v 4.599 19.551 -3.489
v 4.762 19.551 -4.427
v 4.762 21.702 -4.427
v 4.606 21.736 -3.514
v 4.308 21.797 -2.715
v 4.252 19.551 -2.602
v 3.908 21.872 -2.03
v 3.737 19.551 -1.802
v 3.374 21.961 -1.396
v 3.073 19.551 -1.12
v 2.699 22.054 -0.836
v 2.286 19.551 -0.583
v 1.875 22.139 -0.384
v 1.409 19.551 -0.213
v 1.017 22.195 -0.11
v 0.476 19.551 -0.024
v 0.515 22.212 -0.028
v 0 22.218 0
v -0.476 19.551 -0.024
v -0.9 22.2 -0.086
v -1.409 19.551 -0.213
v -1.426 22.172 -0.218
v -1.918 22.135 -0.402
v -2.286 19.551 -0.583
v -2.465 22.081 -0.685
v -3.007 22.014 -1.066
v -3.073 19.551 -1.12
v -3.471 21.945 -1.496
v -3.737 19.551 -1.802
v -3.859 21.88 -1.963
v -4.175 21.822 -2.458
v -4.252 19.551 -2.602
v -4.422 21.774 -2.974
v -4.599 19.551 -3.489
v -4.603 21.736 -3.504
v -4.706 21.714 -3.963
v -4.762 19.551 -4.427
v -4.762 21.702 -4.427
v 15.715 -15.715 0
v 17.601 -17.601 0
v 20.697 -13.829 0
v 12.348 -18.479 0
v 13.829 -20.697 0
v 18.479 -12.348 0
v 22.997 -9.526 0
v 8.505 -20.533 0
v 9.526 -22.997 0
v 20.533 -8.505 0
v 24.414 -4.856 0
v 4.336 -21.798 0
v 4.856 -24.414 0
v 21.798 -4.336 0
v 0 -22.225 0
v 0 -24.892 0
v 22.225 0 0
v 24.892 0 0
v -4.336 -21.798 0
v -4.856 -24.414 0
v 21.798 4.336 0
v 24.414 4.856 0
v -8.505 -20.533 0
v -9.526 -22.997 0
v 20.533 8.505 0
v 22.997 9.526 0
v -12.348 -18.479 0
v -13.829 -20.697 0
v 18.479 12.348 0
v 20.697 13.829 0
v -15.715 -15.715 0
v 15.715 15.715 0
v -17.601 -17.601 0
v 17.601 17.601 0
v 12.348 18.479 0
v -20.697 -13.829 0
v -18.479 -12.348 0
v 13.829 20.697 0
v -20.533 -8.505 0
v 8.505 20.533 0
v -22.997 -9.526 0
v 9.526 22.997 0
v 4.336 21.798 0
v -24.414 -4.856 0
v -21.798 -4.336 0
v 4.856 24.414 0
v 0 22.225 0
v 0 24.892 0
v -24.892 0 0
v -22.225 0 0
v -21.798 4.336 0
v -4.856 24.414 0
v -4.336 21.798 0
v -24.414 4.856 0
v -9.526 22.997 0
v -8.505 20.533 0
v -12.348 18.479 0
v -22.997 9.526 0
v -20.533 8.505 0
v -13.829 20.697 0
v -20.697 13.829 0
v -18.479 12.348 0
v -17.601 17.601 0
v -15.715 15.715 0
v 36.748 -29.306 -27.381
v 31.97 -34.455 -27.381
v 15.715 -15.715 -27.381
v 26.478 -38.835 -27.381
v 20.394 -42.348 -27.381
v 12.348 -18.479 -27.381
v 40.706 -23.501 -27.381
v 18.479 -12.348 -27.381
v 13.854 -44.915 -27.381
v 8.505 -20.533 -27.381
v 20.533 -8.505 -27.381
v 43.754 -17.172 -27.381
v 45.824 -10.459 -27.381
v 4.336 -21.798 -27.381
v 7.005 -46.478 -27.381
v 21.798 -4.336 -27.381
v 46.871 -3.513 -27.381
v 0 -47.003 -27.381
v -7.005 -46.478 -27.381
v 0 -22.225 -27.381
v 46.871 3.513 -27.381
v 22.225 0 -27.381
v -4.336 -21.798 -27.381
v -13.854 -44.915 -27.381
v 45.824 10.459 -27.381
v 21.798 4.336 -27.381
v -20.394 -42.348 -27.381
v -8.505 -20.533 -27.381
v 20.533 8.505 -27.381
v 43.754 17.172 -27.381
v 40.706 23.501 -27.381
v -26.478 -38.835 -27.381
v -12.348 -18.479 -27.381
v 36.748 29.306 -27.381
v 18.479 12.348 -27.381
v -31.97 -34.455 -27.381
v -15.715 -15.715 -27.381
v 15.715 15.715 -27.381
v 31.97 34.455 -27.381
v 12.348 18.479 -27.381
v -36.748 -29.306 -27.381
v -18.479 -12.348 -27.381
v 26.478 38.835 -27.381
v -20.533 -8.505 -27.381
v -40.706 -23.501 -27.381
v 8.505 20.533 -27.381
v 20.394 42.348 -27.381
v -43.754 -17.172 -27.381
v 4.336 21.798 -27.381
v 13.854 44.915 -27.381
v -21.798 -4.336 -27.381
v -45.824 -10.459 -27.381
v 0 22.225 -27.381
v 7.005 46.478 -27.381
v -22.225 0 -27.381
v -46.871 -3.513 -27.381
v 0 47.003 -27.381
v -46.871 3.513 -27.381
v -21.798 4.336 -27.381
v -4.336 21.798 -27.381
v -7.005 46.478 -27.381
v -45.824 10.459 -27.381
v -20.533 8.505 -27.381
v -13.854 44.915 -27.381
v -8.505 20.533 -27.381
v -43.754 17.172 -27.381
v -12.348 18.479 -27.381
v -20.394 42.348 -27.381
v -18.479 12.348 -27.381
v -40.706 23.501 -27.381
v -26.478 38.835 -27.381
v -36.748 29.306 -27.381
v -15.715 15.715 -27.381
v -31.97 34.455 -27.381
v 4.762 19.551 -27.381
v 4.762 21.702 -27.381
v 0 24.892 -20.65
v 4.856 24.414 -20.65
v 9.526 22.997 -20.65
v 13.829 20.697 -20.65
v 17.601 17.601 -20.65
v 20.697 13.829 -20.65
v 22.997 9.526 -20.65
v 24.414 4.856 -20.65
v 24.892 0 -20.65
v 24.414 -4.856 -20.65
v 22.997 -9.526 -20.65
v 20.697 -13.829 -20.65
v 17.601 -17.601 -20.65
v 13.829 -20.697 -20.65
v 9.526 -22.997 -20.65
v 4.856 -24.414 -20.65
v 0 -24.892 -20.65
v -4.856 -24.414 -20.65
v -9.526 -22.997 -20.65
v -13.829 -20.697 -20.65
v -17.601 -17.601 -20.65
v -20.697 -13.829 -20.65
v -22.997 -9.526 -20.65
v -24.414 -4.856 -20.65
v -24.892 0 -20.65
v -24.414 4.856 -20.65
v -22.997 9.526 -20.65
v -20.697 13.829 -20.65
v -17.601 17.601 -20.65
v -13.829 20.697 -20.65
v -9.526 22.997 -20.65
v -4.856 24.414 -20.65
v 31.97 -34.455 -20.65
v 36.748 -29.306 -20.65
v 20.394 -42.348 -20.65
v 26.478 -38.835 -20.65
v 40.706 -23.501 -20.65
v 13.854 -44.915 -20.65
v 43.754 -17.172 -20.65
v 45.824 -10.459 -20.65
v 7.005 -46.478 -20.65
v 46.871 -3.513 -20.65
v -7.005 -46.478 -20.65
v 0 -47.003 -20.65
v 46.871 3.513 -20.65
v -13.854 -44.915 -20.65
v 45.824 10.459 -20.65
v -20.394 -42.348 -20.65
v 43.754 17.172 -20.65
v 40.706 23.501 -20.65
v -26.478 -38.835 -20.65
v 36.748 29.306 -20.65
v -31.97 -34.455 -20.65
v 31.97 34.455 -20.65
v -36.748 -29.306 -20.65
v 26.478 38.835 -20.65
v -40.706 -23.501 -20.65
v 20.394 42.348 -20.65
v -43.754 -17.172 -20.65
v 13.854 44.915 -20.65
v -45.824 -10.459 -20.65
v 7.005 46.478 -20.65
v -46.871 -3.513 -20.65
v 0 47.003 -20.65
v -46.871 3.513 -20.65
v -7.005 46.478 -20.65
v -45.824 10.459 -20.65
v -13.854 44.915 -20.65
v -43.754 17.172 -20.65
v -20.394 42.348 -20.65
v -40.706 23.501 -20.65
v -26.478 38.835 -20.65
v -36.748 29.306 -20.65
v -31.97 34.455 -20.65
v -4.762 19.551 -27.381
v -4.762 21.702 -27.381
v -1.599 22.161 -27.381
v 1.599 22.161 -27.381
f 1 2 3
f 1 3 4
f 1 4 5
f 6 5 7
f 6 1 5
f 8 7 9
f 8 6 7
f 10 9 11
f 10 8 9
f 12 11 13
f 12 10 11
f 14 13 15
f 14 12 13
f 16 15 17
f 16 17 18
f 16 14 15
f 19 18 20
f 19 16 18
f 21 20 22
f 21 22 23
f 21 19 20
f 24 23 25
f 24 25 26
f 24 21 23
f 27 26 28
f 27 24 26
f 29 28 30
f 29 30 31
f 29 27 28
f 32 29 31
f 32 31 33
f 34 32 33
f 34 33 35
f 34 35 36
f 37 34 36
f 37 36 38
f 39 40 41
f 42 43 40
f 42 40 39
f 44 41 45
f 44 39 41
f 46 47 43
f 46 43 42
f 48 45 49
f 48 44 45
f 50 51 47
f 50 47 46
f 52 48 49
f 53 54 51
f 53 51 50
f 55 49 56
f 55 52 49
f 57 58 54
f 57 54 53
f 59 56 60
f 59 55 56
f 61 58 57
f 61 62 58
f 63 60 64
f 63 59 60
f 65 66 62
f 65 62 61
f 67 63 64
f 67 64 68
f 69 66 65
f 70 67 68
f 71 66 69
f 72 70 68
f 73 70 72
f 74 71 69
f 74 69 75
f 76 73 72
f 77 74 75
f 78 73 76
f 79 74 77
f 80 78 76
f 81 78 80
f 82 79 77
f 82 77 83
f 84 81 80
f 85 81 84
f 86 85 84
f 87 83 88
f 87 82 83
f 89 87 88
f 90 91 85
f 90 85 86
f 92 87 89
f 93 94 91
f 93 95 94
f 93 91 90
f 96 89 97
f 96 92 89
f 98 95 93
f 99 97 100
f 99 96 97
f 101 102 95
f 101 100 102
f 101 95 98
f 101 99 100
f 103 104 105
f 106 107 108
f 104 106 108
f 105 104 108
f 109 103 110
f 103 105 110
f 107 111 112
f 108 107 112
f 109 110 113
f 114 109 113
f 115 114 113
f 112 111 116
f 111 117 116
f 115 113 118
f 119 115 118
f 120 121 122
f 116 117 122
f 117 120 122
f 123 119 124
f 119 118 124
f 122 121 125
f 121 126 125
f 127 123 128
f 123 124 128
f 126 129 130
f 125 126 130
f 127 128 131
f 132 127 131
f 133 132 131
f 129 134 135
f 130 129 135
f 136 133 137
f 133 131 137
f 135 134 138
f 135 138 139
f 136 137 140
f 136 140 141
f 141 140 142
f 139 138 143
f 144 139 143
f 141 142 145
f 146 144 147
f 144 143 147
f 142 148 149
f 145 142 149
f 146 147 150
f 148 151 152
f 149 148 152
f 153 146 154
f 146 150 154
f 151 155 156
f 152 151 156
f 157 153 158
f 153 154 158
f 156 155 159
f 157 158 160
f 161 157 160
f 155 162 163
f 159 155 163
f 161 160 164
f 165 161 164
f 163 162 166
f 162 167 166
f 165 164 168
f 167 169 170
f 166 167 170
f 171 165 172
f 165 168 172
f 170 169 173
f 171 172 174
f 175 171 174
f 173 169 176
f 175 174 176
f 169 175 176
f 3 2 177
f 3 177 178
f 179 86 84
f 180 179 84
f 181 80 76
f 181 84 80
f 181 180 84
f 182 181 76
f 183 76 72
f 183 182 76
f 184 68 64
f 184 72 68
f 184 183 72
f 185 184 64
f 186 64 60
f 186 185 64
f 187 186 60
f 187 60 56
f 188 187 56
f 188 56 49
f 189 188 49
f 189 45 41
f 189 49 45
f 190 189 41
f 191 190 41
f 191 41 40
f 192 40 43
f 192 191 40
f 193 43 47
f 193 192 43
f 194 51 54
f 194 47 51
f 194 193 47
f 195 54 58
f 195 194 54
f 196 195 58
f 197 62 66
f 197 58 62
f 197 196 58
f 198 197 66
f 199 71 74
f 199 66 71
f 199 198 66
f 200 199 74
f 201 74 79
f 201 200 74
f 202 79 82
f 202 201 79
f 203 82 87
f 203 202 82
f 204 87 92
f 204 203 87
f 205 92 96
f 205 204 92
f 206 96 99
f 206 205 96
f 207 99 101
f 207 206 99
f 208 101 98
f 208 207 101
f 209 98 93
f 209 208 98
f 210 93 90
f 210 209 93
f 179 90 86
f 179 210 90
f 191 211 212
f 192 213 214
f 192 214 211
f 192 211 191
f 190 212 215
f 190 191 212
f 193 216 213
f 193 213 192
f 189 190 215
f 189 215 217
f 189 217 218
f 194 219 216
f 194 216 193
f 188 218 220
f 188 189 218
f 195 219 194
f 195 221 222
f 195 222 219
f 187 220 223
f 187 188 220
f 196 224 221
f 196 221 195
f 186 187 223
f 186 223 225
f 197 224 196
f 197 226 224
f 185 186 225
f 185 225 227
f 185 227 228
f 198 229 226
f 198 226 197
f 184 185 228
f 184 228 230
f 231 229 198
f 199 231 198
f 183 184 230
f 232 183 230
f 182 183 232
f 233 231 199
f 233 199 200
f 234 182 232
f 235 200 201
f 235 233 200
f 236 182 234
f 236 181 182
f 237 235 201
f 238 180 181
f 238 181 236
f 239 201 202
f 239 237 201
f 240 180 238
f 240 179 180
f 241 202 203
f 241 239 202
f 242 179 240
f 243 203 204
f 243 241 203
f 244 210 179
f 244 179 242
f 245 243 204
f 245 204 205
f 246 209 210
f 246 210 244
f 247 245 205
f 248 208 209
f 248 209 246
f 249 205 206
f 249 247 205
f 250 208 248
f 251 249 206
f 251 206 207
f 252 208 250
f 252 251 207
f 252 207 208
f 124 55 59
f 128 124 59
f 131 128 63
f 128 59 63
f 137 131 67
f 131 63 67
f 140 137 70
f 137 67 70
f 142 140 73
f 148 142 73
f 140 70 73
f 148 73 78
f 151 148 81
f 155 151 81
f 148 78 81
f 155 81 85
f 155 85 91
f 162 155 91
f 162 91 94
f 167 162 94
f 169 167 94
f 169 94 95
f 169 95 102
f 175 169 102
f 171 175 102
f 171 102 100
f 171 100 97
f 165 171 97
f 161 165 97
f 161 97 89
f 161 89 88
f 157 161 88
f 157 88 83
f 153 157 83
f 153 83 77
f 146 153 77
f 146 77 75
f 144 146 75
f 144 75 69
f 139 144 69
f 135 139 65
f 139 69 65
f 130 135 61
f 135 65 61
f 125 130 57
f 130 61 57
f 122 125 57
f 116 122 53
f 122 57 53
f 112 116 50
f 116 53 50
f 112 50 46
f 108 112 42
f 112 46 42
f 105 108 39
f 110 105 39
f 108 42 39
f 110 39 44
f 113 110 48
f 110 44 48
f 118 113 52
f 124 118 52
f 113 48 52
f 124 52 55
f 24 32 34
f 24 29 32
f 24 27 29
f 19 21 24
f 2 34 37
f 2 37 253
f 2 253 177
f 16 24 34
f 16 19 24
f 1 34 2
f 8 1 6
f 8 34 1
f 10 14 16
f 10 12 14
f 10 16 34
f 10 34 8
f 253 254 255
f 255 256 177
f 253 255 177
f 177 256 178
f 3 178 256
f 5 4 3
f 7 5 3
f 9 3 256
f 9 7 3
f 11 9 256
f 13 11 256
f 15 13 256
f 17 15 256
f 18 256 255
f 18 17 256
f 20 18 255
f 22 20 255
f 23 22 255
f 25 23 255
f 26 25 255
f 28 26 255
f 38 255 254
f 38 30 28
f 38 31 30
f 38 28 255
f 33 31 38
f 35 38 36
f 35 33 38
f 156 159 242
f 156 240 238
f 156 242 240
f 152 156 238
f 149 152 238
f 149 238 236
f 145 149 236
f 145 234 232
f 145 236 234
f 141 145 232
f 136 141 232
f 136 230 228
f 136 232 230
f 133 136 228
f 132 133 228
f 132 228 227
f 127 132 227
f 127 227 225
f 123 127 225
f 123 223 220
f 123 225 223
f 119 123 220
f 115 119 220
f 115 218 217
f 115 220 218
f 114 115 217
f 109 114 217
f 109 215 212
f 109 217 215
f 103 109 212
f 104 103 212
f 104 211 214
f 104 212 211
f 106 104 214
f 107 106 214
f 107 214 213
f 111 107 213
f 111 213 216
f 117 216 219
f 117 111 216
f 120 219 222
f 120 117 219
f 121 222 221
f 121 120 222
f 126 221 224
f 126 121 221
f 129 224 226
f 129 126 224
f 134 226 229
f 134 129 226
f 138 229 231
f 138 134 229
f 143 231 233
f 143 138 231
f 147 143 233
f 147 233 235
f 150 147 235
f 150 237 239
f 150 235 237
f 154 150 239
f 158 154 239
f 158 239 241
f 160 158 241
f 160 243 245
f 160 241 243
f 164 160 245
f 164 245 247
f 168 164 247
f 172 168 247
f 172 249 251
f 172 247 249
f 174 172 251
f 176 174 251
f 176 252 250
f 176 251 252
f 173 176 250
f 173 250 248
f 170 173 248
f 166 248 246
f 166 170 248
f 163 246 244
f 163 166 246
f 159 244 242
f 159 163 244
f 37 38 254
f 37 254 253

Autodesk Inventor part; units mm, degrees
ref_plane "YZ Plane" through (0, 0, 0) normal (1, 0, 0) x (0, 1, 0)
ref_plane "XZ Plane" through (0, 0, 0) normal (0, 1, 0) x (-1, 0, 0)
ref_plane "XY Plane" through (0, 0, 0) normal (0, 0, 1) x (1, 0, 0)
sketch "Sketch1" plane through (0, 0, 0) normal (1, 0, 0) x (0, 1, 0)
  line L0 (0, 0) -> (24.892, 0)
  line L1 (24.892, 0) -> (24.892, -20.6502)
  line L2 (24.892, -20.6502) -> (47.0027, -20.6502)
  line L3 (47.0027, -20.6502) -> (47.0027, -27.3812)
  line L4 (47.0027, -27.3812) -> (0, -27.3812)
  line L5 (0, -27.3812) -> (0, 0)
  dimension "d1" = 24.892
  dimension "d2" = 20.6502
  dimension "d3" = 22.1107
  dimension "d4" = 6.731
revolve "Revolution1" add sketch "Sketch1" angle 360 about axis through (0, 0, -27.3812) along (0, 0, 1)
sketch "Sketch2" plane through (0, 0, 0) normal (0, 0, 1) x (1, 0, 0)
  circle A0 centre (0, 0) radius 22.225
  dimension "d6" = 44.45
extrude "Extrusion1" cut sketch "Sketch2" against normal blind 28.575
sketch "Sketch3" plane through (0, 0, 0) normal (0, 0, 1) x (1, 0, 0)
  circle A0 centre (0, 0) radius 22.225
  line L0 (-4.7625, 21.708736) -> (-4.7625, 19.551195)
  line L1 (-4.7625, 19.551195) -> (4.7625, 19.551195)
  line L2 (4.7625, 19.551195) -> (4.7625, 21.708736)
  arc A1 (4.7625, 21.701769) -> (-4.7625, 21.701769) centre (0, 0) ccw
  line L3 (0, 0) -> (0, 24.892)
  circle A2 centre (0, 0) radius 24.892
  point P0 (0, 22.218195)
  dimension "d10" = 9.525
  dimension "d12" = 2.667
sketch "Sketch3 outline for Extrusion2" plane through (0, 0, 0) normal (0, 0, 1) x (1, 0, 0)
  arc A0 (4.7625, 21.701769) -> (-4.7625, 21.701769) centre (0, 0) ccw
  line L0 (4.7625, 19.551195) -> (4.7625, 21.701769)
  line L1 (-4.7625, 19.551195) -> (4.7625, 19.551195)
  line L2 (-4.7625, 21.701769) -> (-4.7625, 19.551195)
extrude "Extrusion2" add sketch "Sketch3 outline for Extrusion2" against normal up to surface (27.3812 mm away)
sketch "Sketch4" plane through (-4.7625, 19.551195, 0) normal (0, -1, 0) x (1, 0, 0)
  line L0 (4.7625, 0) -> (4.7625, -4.7752)
  arc A0 (9.525, -5.123236) -> (0, -5.123236) centre (4.7625, -4.7752) ccw
  line L1 (9.525, 0) -> (0, 0)
  line L2 (4.7625, 0) -> (0, 0)
  line L3 (0, 0) -> (0, -4.427164)
  line L4 (0, 0) -> (0, -27.3812)
  line L5 (4.7625, 0) -> (9.5377, 0)
  line L6 (9.5377, 0) -> (9.525, -4.427164)
  line L7 (9.525, 0) -> (9.525, -27.3812)
  dimension "d15" = 4.7752
extrude "Extrusion3" cut sketch "Sketch4" against normal up to surface contours A0 L3 L1 | A0 L1 L7
properties part number "MotorFlexHub"
